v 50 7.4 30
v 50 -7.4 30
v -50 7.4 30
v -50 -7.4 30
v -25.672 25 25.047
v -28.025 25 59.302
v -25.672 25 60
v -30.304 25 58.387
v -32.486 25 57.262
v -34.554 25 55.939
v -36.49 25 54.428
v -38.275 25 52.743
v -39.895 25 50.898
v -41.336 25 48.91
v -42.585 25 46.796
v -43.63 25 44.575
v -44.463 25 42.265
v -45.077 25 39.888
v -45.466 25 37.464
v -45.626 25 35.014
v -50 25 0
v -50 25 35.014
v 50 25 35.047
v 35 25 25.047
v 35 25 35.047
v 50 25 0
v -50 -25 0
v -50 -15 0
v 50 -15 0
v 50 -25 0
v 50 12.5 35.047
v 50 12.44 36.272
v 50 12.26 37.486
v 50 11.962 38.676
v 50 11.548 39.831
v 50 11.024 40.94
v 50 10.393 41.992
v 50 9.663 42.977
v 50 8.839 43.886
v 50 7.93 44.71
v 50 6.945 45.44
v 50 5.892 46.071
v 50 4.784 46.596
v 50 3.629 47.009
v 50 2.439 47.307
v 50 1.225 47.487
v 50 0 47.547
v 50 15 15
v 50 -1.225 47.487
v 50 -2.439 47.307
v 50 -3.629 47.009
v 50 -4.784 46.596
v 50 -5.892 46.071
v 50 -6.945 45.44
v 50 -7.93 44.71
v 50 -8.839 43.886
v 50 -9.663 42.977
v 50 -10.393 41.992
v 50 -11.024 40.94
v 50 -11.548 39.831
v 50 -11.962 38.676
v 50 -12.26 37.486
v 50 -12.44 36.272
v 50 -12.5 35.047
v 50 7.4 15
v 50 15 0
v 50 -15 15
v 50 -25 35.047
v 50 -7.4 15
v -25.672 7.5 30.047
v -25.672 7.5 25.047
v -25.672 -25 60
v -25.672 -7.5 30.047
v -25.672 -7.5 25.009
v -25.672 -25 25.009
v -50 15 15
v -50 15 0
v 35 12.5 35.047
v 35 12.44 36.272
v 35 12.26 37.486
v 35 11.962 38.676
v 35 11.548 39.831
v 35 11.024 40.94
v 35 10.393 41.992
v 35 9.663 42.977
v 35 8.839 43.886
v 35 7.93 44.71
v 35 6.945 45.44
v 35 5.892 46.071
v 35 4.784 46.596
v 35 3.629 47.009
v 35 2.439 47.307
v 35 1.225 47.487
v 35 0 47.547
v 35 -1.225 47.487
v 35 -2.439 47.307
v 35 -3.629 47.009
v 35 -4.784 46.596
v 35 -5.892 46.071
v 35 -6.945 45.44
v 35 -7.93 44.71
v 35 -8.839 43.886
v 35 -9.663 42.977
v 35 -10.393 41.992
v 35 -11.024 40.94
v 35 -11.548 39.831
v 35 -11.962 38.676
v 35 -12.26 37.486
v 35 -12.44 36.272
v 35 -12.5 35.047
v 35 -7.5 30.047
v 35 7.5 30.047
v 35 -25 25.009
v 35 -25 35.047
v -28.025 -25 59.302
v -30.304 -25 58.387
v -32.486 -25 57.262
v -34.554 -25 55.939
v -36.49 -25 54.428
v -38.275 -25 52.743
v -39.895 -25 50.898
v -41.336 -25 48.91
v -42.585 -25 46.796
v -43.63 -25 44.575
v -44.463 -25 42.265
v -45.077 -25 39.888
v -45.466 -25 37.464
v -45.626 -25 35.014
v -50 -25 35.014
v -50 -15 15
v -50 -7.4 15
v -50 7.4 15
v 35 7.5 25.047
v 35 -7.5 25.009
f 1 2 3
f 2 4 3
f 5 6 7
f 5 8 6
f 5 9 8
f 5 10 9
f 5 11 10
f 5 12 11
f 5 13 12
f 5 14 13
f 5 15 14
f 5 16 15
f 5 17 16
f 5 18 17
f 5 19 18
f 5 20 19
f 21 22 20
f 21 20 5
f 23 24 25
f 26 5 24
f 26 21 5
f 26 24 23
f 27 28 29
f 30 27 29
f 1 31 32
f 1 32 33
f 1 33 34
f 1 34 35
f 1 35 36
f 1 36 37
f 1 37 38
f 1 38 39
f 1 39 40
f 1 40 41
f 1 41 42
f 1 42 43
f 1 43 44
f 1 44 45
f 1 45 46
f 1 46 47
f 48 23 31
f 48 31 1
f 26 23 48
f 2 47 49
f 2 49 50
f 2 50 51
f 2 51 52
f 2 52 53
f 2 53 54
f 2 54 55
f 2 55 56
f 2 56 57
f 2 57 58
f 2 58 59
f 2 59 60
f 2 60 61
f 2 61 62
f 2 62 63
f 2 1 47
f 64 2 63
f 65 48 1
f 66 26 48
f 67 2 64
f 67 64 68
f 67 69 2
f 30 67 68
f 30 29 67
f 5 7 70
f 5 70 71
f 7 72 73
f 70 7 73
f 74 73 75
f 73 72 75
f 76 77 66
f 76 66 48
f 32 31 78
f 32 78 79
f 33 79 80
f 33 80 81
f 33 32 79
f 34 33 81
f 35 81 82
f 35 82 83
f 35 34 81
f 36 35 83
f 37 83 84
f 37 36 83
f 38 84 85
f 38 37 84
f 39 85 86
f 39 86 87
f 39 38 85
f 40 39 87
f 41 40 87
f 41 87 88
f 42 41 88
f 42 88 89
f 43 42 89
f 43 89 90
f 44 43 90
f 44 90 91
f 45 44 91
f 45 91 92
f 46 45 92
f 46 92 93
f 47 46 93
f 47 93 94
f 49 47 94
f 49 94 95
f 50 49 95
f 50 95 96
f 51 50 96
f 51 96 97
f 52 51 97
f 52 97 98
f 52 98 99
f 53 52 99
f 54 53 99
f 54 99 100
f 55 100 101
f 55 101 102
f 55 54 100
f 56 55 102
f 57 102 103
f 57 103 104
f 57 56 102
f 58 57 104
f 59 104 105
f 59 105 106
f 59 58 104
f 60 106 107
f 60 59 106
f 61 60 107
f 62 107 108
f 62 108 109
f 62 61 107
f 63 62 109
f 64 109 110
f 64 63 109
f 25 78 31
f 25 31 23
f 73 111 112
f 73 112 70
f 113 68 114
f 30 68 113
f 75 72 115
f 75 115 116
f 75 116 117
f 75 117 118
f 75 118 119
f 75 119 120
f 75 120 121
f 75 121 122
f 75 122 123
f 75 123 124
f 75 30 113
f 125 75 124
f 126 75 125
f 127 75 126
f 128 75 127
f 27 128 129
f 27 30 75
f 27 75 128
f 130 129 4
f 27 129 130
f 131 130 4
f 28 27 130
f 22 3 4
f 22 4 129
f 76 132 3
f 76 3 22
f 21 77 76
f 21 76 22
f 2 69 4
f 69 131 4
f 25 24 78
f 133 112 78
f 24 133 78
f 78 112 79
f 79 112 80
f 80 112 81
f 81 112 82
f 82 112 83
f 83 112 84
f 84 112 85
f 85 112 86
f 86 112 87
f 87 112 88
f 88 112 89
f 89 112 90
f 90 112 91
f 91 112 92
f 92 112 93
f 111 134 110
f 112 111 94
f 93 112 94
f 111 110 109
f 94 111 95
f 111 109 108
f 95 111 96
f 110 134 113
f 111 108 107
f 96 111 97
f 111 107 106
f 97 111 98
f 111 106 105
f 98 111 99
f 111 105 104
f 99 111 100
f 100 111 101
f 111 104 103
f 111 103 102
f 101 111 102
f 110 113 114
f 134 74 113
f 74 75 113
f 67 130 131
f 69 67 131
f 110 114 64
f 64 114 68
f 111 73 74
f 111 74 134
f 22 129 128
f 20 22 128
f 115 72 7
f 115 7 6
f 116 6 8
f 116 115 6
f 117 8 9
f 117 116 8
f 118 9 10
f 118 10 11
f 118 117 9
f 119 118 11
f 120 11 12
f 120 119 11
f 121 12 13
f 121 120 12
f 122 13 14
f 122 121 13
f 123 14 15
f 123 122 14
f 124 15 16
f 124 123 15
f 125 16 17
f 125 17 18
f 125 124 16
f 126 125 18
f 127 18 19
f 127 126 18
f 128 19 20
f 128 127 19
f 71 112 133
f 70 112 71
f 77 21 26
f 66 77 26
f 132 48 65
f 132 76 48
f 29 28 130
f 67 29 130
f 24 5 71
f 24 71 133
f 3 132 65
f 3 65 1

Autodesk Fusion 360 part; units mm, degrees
sketch "Sketch1" plane through (0, 0, 0) normal (0, 0, 1) x (1, 0, 0)
  line L0 (50, -25) -> (-50, -25)
  line L1 (-50, -25) -> (-50, 25)
  line L2 (-50, 25) -> (50, 25)
  line L3 (50, 25) -> (50, -25)
  line L4 (50, -25) -> (-50, 25) construction
  line L5 (-50, -25) -> (50, 25) construction
  dimension "d1" = 100
  dimension "d2" = 50
extrude "Extrude1" add sketch "Sketch1" along normal blind 60
sketch "Sketch2" plane through (0, -25, 0) normal (0, -1, 0) x (1, 0, 0)
  line L0 (-50, 0) -> (50, 0)
  line L1 (50, 0) -> (50, 60)
  line L2 (50, 60) -> (-50, 60)
  line L3 (-50, 60) -> (-50, 0)
  line L4 (-50, 35.014) -> (-45.6262, 35.014)
  circle A0 centre (-19.3951, 34.5262) radius 26.2357
  line L5 (-25.6715, 60) -> (-25.6715, 25.0092)
  line L6 (-25.6715, 25.0092) -> (35, 25.0092)
  line L7 (35, 25.0092) -> (35, 60)
  line L8 (35, 30.0471) -> (-25.6715, 30.0471)
  line L9 (35, 30.0471) -> (35, 35.0471)
  line L10 (35, 35.0471) -> (50, 35.0471)
  dimension "d25" = 5
extrude "Extrude2" cut sketch "Sketch2" against normal blind 100 contours L2 A0 L7 L8 L9
extrude "Extrude3" cut sketch "Sketch2" against normal blind 100 contours L2 A0 | L2 A0 L5 L8
extrude "Extrude4" cut sketch "Sketch2" against normal blind 17.5 contours A0 L5 L6 L8 | A0 L6 L7 L8
extrude "Extrude5" cut sketch "Sketch2" against normal blind 100 contours L2 L3 L4 A0
sketch "Sketch3" plane through (-50, 0, 0) normal (-1, 0, 0) x (0, -1, 0)
  line L0 (25, 35.014) -> (-25, 35.014)
  line L1 (-25, 35.014) -> (-25, 0)
  line L2 (-25, 0) -> (25, 0)
  line L3 (25, 0) -> (25, 35.014)
  line L4 (-25, 0) -> (-15, 0)
  line L5 (25, 0) -> (15, 0)
  line L6 (15, 0) -> (15, 15)
  line L7 (-15, 0) -> (-15, 15)
  line L8 (-7.4, 15) -> (-7.4, 30)
  line L9 (7.4, 15) -> (7.4, 30)
  line L10 (7.4, 30) -> (-7.4, 30)
  line L11 (-15, 15) -> (-7.4, 15)
  line L12 (15, 15) -> (7.4, 15)
  dimension "d21" = 7.6
  dimension "d22" = 7.6
extrude "Extrude6" cut sketch "Sketch3" against normal blind 100 contours L2 L6 L7 L8 L9 L10 L11 L12
extrude "Extrude7" cut sketch "Sketch2" against normal blind 2 contours L1 L2 L7 L10
sketch "Sketch4" plane through (50, 0, 0) normal (1, 0, 0) x (0, 1, 0)
  line L0 (-23, 35.0471) -> (-25, 35.0471)
  line L1 (-25, 35.0471) -> (-25, 0)
  line L2 (-25, 0) -> (-15, 0)
  line L3 (-15, 0) -> (-15, 15)
  line L4 (-15, 15) -> (-7.4, 15)
  line L5 (-7.4, 15) -> (-7.4, 30)
  line L6 (-7.4, 30) -> (7.4, 30)
  line L7 (7.4, 30) -> (7.4, 15)
  line L8 (7.4, 15) -> (15, 15)
  line L9 (15, 15) -> (15, 0)
  line L10 (15, 0) -> (25, 0)
  line L11 (25, 0) -> (25, 60)
  line L12 (25, 60) -> (-23, 60)
  line L13 (-23, 60) -> (-23, 35.0471)
  line L14 (-25, 35.0471) -> (25, 35.0471)
  circle A0 centre (0, 35.0471) radius 12.5
  dimension "d28" = 25
extrude "Extrude8" cut sketch "Sketch4" against normal blind 50 contours L11 L12 L13 L14 A0
sketch "Sketch5" plane through (0, 25, 0) normal (0, 1, 0) x (-1, 0, 0)
  line L0 (-35, 35.0471) -> (-50, 35.0471)
  line L1 (-50, 35.0471) -> (-50, 0)
  line L2 (-50, 0) -> (50, 0)
  line L3 (50, 0) -> (50, 35.014)
  line L4 (50, 35.014) -> (45.6262, 35.014)
  arc A0 (45.6262, 35.014) -> (25.6715, 60) centre (19.3951, 34.5262) ccw
  line L5 (25.6715, 60) -> (25.6715, 30.0471)
  line L6 (25.6715, 30.0471) -> (-35, 30.0471)
  line L7 (-35, 30.0471) -> (-35, 35.0471)
  line L8 (25.6715, 30.0471) -> (25.6715, 25.0471)
  line L9 (25.6715, 25.0471) -> (-29.3285, 25.0471)
  line L10 (-29.3285, 25.0471) -> (-35, 30.0471)
  line L11 (-35, 30.0471) -> (-35, 17)
  line L12 (-29.3285, 25.0471) -> (-40, 25.0471)
  dimension "d31" = 5
  dimension "d32" = 55
extrude "Extrude9" cut sketch "Sketch5" against normal blind 17.5 contours L6 L8 L9 L10
extrude "Extrude10" cut sketch "Sketch5" against normal blind 17.5 contours L10 L11 L12
